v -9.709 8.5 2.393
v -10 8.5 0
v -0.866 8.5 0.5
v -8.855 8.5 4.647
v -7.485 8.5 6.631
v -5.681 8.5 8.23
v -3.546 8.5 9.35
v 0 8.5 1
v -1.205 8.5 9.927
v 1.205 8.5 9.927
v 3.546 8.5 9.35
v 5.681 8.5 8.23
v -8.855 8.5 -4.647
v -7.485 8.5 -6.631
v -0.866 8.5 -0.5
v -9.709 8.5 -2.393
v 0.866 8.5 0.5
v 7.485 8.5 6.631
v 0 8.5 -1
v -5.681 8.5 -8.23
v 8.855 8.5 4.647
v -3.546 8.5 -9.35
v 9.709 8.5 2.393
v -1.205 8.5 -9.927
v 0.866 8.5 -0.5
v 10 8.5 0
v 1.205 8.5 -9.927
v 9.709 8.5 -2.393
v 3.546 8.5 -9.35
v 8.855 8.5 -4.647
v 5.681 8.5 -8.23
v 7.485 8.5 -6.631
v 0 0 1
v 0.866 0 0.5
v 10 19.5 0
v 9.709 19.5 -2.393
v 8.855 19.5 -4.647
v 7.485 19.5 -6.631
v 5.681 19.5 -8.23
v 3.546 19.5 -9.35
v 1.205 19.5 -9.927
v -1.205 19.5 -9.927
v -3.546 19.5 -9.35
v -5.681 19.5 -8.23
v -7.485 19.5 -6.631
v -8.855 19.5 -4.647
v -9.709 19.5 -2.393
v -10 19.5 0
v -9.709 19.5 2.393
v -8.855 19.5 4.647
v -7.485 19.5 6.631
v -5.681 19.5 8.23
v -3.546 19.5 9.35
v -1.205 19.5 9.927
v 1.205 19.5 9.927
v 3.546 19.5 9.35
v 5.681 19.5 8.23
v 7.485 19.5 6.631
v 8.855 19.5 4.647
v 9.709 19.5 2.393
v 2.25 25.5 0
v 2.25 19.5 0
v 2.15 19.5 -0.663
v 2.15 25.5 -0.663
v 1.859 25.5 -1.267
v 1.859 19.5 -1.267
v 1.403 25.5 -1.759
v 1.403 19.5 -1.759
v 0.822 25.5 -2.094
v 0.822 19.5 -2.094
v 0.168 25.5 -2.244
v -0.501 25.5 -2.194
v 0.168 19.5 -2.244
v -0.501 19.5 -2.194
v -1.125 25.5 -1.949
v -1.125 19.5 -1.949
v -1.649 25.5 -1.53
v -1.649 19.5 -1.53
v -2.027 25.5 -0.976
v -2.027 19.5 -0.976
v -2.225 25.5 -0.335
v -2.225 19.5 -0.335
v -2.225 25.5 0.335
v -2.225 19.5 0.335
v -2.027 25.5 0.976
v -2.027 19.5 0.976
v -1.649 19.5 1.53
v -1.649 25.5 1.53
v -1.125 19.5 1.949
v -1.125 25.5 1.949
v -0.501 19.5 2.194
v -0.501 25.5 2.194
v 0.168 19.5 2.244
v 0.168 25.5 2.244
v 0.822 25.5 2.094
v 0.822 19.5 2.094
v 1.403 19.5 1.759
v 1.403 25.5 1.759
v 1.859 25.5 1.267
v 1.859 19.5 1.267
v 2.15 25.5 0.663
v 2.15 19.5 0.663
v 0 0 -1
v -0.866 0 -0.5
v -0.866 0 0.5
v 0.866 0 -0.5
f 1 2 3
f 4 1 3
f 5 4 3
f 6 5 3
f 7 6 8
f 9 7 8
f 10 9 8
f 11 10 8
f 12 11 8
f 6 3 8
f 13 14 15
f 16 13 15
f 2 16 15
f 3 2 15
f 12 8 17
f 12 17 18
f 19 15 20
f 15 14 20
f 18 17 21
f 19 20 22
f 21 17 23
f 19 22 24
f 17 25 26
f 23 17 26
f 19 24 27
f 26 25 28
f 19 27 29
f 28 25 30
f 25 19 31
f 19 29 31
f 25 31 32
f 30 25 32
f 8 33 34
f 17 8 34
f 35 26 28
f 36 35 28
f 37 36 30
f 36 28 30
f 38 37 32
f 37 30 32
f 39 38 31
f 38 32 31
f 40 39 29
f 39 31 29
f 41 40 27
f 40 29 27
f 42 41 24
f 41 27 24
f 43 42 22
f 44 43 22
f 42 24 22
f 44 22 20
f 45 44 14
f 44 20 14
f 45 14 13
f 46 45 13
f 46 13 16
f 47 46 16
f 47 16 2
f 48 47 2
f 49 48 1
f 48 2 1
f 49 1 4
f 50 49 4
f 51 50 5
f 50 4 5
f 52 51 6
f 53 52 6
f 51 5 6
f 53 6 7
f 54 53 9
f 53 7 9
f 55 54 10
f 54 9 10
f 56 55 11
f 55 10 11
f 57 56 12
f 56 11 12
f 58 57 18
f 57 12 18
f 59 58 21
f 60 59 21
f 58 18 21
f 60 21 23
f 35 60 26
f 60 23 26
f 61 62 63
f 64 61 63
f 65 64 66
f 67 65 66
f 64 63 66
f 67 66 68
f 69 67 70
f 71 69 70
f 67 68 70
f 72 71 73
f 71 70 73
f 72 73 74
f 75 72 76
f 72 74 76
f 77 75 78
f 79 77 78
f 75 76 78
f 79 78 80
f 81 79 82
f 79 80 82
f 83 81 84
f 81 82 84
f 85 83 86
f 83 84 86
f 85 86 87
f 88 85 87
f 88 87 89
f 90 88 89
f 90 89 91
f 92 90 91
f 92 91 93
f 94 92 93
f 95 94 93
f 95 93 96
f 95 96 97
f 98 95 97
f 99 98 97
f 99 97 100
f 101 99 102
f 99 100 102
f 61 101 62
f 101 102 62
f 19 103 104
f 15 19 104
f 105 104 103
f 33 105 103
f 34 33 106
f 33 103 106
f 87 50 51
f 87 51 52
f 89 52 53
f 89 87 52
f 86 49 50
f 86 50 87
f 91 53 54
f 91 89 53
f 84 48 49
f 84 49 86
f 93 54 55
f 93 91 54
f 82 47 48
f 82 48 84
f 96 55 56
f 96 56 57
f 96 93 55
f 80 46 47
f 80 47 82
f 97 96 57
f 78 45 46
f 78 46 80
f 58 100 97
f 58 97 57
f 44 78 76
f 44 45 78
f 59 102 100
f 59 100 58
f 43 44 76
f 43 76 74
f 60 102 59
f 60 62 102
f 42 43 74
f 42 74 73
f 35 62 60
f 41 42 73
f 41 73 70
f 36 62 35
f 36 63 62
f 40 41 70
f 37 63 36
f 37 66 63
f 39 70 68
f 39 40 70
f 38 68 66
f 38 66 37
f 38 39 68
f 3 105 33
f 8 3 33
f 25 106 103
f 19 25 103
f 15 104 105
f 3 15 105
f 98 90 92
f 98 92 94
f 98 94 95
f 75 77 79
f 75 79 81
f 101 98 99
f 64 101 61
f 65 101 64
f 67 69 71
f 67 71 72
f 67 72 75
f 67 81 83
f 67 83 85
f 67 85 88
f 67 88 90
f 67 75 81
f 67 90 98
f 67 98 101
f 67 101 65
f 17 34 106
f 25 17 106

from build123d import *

# Parameters (mm, degrees)
BOSS_EXTRUDE1_DEPTH = 8.5
SKETCH2_R           = 10
BOSS_EXTRUDE2_DEPTH = 11
SKETCH3_R           = 2.25
BOSS_EXTRUDE3_DEPTH = 6


with BuildPart() as part:
    # Sketch1 → Boss-Extrude1 (new body)
    with BuildSketch(Plane(origin=(0, 0, 0), x_dir=(1, 0, 0), z_dir=(0, 1, 0))):
        Polygon((0, 1), (-0.866025404, 0.5), (-0.866025404, -0.5), (0, -1), (0.866025404, -0.5), (0.866025404, 0.5), align=None)
    extrude(amount=BOSS_EXTRUDE1_DEPTH)

    # Sketch2 → Boss-Extrude2 (add)
    with BuildSketch(Plane(origin=(0, 8.5, 0), x_dir=(1, 0, 0), z_dir=(0, 1, 0))):
        Circle(SKETCH2_R)
    extrude(amount=BOSS_EXTRUDE2_DEPTH)

    # Sketch3 → Boss-Extrude3 (add)
    with BuildSketch(Plane(origin=(0, 19.5, 0), x_dir=(1, 0, 0), z_dir=(0, 1, 0))):
        Circle(SKETCH3_R)
    extrude(amount=BOSS_EXTRUDE3_DEPTH)


solid = part.part
